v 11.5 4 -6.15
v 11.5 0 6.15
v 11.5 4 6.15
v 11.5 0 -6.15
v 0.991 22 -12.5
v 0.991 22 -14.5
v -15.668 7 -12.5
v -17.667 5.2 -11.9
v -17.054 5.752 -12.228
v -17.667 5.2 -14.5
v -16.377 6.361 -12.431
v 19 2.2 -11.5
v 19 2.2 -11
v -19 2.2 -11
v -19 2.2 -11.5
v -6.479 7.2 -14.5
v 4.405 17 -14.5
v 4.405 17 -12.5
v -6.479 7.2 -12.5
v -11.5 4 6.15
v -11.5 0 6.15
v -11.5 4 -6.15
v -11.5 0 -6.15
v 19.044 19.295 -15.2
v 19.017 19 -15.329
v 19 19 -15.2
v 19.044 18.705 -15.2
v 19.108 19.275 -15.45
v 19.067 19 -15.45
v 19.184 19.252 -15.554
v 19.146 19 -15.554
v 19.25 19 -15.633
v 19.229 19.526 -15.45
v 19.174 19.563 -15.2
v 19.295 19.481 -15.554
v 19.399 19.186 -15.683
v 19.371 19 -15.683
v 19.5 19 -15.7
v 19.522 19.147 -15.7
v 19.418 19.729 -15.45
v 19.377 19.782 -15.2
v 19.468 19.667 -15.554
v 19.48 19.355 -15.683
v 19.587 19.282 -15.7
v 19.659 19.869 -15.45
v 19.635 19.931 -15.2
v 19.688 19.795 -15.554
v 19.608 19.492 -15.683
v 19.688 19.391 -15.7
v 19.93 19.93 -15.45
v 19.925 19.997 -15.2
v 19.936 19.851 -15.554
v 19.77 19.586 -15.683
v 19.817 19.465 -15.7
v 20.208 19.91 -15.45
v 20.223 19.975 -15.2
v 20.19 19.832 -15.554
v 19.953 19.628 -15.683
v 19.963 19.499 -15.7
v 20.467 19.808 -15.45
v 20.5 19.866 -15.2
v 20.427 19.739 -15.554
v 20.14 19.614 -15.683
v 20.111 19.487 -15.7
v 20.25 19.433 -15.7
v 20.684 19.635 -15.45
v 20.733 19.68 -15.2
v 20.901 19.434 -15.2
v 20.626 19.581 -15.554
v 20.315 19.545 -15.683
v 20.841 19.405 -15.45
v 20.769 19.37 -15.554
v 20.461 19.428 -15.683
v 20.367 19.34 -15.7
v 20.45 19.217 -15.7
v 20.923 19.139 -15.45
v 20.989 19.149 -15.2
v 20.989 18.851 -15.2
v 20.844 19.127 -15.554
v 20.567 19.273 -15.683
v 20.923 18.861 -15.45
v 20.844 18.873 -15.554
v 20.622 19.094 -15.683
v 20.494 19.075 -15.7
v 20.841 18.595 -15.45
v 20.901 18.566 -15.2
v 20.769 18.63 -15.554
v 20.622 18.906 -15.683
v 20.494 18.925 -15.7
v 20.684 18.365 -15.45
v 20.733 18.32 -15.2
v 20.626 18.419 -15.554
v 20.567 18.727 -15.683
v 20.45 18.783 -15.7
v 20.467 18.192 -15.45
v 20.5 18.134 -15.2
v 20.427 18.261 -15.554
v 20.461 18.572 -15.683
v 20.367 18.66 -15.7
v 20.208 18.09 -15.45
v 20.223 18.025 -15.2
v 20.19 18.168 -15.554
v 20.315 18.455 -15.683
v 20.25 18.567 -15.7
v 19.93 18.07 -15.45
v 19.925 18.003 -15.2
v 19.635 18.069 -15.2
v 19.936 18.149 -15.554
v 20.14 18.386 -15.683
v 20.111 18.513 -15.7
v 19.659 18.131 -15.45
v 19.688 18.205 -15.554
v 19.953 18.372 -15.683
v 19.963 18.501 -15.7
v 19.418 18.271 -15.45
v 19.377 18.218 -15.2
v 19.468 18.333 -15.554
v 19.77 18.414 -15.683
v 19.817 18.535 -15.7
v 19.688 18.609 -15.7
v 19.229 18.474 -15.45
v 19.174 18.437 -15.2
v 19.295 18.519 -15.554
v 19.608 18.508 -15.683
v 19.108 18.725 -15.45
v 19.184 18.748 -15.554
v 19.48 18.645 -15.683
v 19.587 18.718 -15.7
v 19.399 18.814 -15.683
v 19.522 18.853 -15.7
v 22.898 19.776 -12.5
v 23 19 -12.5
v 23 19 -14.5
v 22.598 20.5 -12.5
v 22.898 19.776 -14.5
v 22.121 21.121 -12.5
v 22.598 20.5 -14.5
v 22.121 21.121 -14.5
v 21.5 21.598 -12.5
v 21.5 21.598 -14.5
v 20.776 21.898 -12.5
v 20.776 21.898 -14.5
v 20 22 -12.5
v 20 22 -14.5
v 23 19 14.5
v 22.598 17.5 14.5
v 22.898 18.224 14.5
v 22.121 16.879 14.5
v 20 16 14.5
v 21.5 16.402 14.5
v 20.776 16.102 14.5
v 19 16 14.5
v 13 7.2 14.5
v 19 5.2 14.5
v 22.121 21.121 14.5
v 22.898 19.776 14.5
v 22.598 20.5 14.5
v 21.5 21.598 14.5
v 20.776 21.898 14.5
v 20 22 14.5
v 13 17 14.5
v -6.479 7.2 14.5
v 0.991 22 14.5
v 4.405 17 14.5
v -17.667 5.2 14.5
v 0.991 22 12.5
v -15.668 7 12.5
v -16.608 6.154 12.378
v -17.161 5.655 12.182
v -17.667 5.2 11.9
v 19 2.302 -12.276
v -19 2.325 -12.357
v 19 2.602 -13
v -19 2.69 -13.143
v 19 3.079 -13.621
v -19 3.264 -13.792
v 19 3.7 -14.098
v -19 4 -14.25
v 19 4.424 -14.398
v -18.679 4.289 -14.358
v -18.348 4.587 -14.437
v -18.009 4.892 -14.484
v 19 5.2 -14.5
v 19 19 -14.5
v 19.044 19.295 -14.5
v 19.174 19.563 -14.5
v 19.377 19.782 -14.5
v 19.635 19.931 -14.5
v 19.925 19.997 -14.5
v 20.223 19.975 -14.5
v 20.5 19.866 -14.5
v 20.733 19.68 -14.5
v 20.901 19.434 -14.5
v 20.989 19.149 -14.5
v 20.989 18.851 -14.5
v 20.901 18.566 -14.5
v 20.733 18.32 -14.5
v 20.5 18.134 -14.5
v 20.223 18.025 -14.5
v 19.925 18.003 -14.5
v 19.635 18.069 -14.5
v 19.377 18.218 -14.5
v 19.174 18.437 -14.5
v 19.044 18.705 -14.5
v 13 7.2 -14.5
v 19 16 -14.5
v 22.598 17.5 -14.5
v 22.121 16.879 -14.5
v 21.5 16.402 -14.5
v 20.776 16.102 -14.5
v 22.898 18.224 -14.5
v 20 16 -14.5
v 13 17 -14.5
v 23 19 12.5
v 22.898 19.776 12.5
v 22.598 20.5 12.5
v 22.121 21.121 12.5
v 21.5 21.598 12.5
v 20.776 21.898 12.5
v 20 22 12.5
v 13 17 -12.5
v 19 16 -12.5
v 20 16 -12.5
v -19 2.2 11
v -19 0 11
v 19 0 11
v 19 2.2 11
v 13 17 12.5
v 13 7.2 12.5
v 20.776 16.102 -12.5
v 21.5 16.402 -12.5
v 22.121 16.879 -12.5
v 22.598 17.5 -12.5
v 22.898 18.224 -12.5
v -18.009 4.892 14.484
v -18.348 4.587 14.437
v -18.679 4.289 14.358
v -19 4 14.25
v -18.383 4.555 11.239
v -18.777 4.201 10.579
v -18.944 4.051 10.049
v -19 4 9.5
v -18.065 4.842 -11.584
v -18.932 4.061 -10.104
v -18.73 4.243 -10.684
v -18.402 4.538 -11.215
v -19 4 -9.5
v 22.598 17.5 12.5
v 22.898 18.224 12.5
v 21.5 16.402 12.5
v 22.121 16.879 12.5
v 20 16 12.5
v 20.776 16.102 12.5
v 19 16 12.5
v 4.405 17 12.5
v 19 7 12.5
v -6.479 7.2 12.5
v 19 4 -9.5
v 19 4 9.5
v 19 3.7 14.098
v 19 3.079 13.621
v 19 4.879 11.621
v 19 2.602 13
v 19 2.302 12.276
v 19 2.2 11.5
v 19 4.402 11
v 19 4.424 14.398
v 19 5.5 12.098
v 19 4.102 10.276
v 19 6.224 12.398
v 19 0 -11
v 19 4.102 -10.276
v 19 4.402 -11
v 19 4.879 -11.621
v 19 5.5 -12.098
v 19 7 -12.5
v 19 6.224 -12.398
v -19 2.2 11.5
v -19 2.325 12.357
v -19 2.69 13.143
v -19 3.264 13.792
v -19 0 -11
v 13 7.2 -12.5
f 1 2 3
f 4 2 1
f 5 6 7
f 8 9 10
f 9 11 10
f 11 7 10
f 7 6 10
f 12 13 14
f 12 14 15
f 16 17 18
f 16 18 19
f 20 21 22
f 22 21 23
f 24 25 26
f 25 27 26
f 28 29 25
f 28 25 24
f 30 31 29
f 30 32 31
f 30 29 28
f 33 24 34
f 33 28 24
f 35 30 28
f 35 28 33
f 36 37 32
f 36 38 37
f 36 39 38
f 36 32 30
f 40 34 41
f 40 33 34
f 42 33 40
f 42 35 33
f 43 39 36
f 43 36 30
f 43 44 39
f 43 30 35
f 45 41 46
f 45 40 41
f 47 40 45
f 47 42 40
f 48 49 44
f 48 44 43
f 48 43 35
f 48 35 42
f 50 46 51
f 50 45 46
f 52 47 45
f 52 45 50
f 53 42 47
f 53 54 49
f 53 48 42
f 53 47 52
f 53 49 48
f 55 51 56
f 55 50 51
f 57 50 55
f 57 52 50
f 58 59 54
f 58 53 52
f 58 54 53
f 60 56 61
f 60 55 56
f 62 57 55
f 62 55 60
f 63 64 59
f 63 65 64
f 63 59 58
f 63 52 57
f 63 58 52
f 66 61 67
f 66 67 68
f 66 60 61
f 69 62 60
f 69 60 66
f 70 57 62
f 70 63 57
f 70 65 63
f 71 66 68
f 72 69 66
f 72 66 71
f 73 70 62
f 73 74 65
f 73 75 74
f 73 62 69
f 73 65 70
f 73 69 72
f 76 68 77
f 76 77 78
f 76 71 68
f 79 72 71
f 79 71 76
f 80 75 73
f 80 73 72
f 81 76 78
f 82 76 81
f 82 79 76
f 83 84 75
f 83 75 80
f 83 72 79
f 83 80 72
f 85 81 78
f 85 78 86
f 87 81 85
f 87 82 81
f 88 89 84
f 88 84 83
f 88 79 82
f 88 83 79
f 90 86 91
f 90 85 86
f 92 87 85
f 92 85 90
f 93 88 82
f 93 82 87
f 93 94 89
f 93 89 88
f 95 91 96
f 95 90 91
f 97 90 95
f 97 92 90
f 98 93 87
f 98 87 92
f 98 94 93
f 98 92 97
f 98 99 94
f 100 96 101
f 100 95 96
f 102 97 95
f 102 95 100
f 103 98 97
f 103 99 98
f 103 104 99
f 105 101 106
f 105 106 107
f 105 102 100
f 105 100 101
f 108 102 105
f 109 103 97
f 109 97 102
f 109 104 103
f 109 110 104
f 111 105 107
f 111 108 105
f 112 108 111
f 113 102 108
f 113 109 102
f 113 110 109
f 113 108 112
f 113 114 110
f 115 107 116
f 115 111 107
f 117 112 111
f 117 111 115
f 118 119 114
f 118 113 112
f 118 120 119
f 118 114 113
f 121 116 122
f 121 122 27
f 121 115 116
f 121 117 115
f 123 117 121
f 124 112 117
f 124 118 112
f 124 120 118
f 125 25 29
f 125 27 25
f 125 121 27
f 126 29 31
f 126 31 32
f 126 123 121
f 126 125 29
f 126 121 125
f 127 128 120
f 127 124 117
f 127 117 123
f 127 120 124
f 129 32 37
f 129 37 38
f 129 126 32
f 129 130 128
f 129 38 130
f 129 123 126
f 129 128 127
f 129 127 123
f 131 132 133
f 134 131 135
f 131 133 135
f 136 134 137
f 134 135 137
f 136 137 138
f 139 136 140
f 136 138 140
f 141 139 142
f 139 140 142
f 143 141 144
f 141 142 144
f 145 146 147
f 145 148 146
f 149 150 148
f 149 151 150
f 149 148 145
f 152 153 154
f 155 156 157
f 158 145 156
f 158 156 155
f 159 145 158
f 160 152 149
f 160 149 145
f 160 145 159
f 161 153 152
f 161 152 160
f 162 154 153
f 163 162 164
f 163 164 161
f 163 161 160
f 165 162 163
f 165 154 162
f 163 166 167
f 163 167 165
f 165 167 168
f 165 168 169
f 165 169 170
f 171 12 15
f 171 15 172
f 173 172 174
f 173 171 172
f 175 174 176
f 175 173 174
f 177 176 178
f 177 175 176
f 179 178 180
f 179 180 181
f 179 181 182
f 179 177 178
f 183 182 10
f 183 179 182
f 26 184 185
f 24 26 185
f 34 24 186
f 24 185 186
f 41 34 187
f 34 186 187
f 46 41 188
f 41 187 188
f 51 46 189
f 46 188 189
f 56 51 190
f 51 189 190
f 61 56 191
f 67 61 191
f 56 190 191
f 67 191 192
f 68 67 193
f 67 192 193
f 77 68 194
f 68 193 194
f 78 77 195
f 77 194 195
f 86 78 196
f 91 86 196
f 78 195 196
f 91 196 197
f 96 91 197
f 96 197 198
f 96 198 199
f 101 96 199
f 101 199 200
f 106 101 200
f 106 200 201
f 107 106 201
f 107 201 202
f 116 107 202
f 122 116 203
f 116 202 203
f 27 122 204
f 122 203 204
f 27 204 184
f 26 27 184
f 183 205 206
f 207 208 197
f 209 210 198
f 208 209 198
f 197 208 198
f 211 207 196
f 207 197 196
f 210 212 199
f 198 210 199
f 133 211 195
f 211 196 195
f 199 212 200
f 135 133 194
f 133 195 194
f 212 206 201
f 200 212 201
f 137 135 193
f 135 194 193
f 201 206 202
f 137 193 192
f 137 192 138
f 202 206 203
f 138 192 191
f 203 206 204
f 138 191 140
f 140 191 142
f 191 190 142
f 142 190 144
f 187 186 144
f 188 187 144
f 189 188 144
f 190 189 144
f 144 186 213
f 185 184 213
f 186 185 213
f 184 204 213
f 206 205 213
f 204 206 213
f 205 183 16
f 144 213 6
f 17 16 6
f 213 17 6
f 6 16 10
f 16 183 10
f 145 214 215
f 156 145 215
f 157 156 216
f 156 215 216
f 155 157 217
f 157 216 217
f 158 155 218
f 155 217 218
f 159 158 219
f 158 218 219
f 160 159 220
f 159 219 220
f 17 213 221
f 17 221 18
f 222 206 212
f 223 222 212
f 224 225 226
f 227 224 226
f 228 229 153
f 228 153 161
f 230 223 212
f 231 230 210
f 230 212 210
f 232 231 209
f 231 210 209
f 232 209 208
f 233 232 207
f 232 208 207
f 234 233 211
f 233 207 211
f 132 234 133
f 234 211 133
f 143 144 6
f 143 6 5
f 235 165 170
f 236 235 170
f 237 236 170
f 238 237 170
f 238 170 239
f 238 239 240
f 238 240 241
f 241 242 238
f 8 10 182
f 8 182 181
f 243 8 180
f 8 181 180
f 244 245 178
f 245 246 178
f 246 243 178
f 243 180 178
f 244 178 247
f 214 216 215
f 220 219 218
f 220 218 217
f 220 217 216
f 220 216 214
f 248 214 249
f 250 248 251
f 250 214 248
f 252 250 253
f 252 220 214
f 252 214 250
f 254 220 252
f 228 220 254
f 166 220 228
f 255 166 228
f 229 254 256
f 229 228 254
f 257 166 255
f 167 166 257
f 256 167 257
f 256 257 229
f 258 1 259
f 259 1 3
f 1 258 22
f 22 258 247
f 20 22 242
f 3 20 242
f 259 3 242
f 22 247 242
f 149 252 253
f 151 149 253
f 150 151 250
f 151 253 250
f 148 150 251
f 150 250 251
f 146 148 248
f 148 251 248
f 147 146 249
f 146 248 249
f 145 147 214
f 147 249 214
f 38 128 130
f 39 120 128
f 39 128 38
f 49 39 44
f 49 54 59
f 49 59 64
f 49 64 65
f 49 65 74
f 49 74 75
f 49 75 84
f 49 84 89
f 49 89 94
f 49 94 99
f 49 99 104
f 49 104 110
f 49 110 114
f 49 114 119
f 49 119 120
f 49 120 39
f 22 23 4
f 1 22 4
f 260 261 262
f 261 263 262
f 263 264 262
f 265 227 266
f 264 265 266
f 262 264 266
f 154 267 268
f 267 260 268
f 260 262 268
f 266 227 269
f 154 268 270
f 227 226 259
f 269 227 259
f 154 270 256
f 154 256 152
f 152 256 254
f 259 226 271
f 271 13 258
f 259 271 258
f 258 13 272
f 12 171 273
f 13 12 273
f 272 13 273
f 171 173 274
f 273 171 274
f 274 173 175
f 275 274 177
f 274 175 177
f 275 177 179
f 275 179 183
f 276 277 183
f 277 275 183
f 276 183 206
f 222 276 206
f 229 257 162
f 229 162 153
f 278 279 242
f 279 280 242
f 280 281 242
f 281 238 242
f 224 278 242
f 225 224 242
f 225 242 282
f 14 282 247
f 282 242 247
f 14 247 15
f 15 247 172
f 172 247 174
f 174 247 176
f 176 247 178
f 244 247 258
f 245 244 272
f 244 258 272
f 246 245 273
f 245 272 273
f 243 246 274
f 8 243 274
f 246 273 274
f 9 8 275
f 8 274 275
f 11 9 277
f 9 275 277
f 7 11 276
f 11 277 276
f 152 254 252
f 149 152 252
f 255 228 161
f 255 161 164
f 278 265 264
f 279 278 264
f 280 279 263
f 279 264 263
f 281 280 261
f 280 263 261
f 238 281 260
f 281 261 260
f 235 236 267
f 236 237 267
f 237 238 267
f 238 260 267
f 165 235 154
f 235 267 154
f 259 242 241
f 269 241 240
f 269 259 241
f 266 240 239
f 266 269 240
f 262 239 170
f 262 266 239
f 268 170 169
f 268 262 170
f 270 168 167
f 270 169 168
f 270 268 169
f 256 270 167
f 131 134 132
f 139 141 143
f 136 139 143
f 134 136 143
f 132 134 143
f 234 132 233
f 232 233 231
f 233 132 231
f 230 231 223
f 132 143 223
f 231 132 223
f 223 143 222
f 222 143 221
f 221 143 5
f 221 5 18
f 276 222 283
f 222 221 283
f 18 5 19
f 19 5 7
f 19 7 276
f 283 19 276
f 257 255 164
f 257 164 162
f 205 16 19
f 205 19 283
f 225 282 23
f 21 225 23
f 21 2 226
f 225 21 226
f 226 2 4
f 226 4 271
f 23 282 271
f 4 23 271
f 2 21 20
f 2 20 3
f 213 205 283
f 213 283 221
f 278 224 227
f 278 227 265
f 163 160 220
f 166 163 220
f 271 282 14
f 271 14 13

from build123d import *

# Parameters (mm, degrees)
SKETCH1_W           = 38
SKETCH1_H           = 22
SKETCH1_W_2         = 23
SKETCH1_H_2         = 12.3
BOSS_EXTRUDE1_DEPTH = 4
BOSS_EXTRUDE2_DEPTH = 42
FILLET1_R           = 3
SKETCH4_W           = 4
SKETCH4_H           = 4.046186486
CUT_EXTRUDE1_DEPTH  = 44.058100283
CUT_EXTRUDE2_DEPTH  = 44.058100283
SKETCH7_R           = 1
BOSS_EXTRUDE3_DEPTH = 1.2
FILLET2_R           = 0.5


with BuildPart() as part:
    # Sketch1 → Boss-Extrude1 (new body)
    with BuildSketch(Plane(origin=(0, 0, 0), x_dir=(1, 0, 0), z_dir=(0, 1, 0))):
        Rectangle(SKETCH1_W, SKETCH1_H)
        Rectangle(SKETCH1_W_2, SKETCH1_H_2, mode=Mode.SUBTRACT)
    extrude(amount=BOSS_EXTRUDE1_DEPTH)

    # Sketch2 → Boss-Extrude2 (add)
    with BuildSketch(Plane.ZY.offset(19)):
        Polygon((-11, 2.2), (-14.5, 2.2), (-14.5, 22), (-12.5, 22), (-12.5, 4), (-11, 4), align=None)
        Polygon((12.5, 4), (11, 4), (11, 2.2), (14.5, 2.2), (14.5, 22), (12.5, 22), align=None)
    extrude(amount=-BOSS_EXTRUDE2_DEPTH)

    # Fillet1
    fillet1_edges = [part.edges().sort_by_distance(p)[0] for p in [
        (2, 2.2, 14.5),
        (2, 2.2, -14.5),
        (2, 4, 12.5),
        (2, 4, -12.5),
    ]]
    fillet(fillet1_edges, radius=FILLET1_R)

    # Sketch4 → Cut-Extrude1 (cut, through all)
    with BuildSketch(Plane(origin=(0, 0, -14.5), x_dir=(-1, 0, 0), z_dir=(0, 0, -1))):
        with Locations((-21, 3.176906757)):
            Rectangle(SKETCH4_W, SKETCH4_H)
        with BuildLine():
            Line((-23, 5.2), (-19, 5.2))
            Line((-19, 5.2), (-19, 16))
            Line((-19, 16), (-20, 16))
            ThreePointArc((-20, 16), (-22.121320344, 16.878679656), (-23, 19))
            Line((-23, 19), (-23, 5.2))
        make_face()
        with BuildLine():
            ThreePointArc((-23, 19), (-22.121320344, 21.121320344), (-20, 22))
            Line((-20, 22), (-23, 22))
            Line((-23, 22), (-23, 19))
        make_face()
        Polygon((-0.991025267, 22), (17.667264982, 5.2), (19, 5.2), (19, 22), align=None)
        Polygon((17.667264982, 5.2), (19, 4), (19, 5.2), align=None)
    extrude(amount=-CUT_EXTRUDE1_DEPTH, mode=Mode.SUBTRACT)

    # Sketch6 → Cut-Extrude2 (cut, through all)
    with BuildSketch(Plane(origin=(0, 0, -14.5), x_dir=(-1, 0, 0), z_dir=(0, 0, -1))):
        Polygon((6.479180653, 7.2), (-13, 7.2), (-13, 17), (-4.404821992, 17), align=None)
    extrude(amount=-CUT_EXTRUDE2_DEPTH, mode=Mode.SUBTRACT)

    # Sketch7 → Boss-Extrude3 (add)
    with BuildSketch(Plane(origin=(0, 0, -14.5), x_dir=(-1, 0, 0), z_dir=(0, 0, -1))):
        with Locations((-20, 19)):
            Circle(SKETCH7_R)
    extrude(amount=BOSS_EXTRUDE3_DEPTH)

    # Fillet2
    fillet2_edges = [part.edges().sort_by_distance(p)[0] for p in [
        (21, 19, -15.7),
    ]]
    fillet(fillet2_edges, radius=FILLET2_R)


solid = part.part
